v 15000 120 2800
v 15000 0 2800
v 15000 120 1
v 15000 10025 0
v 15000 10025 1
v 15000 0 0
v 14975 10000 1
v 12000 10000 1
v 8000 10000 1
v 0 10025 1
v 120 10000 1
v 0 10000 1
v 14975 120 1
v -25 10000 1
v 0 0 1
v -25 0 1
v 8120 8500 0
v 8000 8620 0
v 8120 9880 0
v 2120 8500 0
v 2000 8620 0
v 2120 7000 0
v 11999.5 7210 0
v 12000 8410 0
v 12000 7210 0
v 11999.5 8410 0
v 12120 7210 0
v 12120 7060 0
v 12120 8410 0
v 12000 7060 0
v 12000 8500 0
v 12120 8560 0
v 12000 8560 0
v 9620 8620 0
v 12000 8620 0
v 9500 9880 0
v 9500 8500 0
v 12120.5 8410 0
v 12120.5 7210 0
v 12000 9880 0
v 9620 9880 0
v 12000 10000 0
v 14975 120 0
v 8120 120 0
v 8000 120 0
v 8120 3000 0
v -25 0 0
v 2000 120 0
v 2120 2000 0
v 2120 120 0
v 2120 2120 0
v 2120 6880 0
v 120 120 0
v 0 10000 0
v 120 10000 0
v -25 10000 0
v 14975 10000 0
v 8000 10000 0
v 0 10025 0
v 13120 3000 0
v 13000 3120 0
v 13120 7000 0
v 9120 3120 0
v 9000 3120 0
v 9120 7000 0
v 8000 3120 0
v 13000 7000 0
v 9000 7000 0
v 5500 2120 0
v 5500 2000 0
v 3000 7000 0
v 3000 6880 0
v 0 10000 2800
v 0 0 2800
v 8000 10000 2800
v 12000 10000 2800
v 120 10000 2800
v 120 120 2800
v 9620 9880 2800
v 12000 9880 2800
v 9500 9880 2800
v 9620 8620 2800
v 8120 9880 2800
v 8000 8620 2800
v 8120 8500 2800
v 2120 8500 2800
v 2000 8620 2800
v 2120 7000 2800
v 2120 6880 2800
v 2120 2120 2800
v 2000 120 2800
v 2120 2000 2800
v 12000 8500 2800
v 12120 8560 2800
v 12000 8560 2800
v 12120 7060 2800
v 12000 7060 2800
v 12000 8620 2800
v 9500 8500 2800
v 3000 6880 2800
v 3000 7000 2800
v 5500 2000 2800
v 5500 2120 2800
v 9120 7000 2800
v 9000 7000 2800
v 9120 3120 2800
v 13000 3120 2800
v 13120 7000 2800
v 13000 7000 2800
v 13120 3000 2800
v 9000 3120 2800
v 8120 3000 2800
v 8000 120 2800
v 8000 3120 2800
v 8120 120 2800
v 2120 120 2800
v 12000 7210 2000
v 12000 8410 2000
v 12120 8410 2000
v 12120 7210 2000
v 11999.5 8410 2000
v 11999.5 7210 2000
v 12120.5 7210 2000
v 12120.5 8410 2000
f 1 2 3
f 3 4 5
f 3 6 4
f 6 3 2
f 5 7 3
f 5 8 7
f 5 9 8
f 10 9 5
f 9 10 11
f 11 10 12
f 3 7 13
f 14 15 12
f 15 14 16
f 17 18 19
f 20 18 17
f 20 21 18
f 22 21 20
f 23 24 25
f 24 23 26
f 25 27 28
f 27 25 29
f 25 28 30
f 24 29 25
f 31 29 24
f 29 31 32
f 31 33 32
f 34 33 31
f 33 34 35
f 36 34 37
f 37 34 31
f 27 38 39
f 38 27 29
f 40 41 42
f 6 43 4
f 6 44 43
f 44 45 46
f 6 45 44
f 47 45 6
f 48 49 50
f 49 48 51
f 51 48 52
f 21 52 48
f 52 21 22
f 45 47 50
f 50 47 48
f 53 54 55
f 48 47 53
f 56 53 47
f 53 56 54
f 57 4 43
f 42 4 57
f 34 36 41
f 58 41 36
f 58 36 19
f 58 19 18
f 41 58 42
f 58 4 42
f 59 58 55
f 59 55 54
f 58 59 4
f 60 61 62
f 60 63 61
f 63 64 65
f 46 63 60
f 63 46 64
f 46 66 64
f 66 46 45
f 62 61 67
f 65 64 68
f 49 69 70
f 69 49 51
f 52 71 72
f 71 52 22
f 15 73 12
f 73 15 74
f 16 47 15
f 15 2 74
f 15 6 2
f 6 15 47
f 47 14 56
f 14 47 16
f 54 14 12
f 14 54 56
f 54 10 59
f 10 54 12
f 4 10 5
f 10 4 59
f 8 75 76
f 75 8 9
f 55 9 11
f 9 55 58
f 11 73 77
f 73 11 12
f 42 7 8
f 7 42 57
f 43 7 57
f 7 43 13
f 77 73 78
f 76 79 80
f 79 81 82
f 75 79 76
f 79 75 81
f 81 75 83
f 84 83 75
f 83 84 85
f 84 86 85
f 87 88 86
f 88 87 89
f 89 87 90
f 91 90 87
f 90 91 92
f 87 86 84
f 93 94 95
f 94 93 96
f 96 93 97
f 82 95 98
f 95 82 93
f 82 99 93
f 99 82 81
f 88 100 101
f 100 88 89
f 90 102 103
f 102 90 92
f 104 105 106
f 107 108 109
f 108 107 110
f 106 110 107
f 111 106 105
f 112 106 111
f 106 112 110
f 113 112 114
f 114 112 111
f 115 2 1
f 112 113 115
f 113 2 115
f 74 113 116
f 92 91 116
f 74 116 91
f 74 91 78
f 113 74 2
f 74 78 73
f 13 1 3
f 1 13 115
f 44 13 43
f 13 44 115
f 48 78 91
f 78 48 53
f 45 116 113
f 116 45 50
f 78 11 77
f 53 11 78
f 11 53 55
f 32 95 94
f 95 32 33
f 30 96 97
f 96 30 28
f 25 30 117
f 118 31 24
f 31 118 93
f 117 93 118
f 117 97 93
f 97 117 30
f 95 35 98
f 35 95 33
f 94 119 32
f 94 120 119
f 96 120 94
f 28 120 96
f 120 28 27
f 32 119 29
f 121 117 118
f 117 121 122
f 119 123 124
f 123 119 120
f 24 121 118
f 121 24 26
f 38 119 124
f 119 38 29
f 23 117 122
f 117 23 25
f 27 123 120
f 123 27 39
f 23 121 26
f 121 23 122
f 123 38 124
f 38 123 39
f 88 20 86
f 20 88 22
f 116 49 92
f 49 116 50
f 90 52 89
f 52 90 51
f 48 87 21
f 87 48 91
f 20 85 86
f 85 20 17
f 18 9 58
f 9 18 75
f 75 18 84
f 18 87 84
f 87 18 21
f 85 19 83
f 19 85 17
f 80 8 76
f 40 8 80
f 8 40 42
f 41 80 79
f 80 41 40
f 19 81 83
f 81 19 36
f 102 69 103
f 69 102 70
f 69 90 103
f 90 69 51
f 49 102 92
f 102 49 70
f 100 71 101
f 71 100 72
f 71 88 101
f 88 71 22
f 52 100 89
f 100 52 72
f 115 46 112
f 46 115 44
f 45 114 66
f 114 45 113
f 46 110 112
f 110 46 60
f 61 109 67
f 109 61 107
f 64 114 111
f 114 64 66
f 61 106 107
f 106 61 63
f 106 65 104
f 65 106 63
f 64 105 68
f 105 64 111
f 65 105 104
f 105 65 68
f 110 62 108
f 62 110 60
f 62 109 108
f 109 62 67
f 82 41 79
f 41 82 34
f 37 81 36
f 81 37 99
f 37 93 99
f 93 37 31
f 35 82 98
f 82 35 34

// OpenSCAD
module lineaLimite(largo, rotar=0, color="#000") {
    color(color)
    rotate(a=rotar)
    cube([largo, 25, 1]);
}


gruesoMuro=120;
alturaMuro=2800;
module Muro(largo, alto=alturaMuro, ancho=gruesoMuro, rotar=0, color="#bdc3c7") {
    color(color)
    rotate(a=rotar)
    cube([largo, ancho, alto]);
}


module puerta(largo=900, alto=2000, ancho=gruesoMuro, rotar=0, color="#5D432C") {
    sobresaliente=.5;
    color(color)
    rotate(a=rotar)
    translate([0, 0-sobresaliente, 0])
    cube([largo, ancho+(sobresaliente*2), alto]);
}

module ventana(largo, alto, rotar=0) {
    sobresaliente=.5;
    translate([0, 0-sobresaliente, 0])
    cube([largo, gruesoMuro+(sobresaliente*2), alto]);
}




// CONTORNO TERRENO
module contornoTerreno() union() {
    lineaLimite(largo=15000);
    lineaLimite(largo=10000, rotar=90);
    translate([0, 10000, 0])
    lineaLimite(largo=15000);
    translate([15000, 0, 0])
    lineaLimite(largo=10000, rotar=90);
}
contornoTerreno();


// BARDA ESCUADRA
module bardaEscuadra() union() {
    Muro(largo=15000);
    translate([gruesoMuro, 0, 0])
    Muro(largo=10000, rotar=90);
}
bardaEscuadra();


// CONTORNO CONTRUCCIÓN


// PUERTA PRINCIPAL
_espacioMuro=1500;
translate([12000+gruesoMuro, 7000+(gruesoMuro/2), 0])
Muro(largo=_espacioMuro, rotar=90, color="#fff");
_espacioPuerta=1200;
translate([
    12000+gruesoMuro,
    7000+(gruesoMuro/2)+(_espacioMuro/2)-(_espacioPuerta/2),
    0])
puerta(largo=1200, rotar=90);




grueso_barda=120;
altura_barda=2800;

//
translate([2000, 0, 0])
cube([grueso_barda, 8500, altura_barda]);

translate([2000, 8500, 0])
cube([6000, grueso_barda, altura_barda]);

translate([8000, 8500, 0])
cube([grueso_barda, 1500, altura_barda]);

translate([8000, 10000-grueso_barda, 0])
cube([4000, grueso_barda, altura_barda]);

translate([2000, 2000, 0])
cube([3500, grueso_barda, altura_barda]);

translate([2000, 7000-grueso_barda, 0])
cube([1000, grueso_barda, altura_barda]);

//translate([12000, 8500, 0])
//cube([grueso_barda, 1500, altura_barda]);



// cochera
translate([8000, 0, 0])
cube([grueso_barda, 3000, altura_barda]);
translate([8000, 3000, 0])
cube([5000, grueso_barda, altura_barda]);


// recamara
translate([9000, 3000, 0])
cube([grueso_barda, 4000, altura_barda]);
//translate([9000, 7000, 0])
//cube([4000, grueso_barda, altura_barda]);
translate([13000, 3000, 0])
cube([grueso_barda, 4000, altura_barda]);





translate([9500, 8500, 0])
cube([grueso_barda, 1500, altura_barda]);
translate([9500, 8500, 0])
cube([2500, grueso_barda, altura_barda]);
